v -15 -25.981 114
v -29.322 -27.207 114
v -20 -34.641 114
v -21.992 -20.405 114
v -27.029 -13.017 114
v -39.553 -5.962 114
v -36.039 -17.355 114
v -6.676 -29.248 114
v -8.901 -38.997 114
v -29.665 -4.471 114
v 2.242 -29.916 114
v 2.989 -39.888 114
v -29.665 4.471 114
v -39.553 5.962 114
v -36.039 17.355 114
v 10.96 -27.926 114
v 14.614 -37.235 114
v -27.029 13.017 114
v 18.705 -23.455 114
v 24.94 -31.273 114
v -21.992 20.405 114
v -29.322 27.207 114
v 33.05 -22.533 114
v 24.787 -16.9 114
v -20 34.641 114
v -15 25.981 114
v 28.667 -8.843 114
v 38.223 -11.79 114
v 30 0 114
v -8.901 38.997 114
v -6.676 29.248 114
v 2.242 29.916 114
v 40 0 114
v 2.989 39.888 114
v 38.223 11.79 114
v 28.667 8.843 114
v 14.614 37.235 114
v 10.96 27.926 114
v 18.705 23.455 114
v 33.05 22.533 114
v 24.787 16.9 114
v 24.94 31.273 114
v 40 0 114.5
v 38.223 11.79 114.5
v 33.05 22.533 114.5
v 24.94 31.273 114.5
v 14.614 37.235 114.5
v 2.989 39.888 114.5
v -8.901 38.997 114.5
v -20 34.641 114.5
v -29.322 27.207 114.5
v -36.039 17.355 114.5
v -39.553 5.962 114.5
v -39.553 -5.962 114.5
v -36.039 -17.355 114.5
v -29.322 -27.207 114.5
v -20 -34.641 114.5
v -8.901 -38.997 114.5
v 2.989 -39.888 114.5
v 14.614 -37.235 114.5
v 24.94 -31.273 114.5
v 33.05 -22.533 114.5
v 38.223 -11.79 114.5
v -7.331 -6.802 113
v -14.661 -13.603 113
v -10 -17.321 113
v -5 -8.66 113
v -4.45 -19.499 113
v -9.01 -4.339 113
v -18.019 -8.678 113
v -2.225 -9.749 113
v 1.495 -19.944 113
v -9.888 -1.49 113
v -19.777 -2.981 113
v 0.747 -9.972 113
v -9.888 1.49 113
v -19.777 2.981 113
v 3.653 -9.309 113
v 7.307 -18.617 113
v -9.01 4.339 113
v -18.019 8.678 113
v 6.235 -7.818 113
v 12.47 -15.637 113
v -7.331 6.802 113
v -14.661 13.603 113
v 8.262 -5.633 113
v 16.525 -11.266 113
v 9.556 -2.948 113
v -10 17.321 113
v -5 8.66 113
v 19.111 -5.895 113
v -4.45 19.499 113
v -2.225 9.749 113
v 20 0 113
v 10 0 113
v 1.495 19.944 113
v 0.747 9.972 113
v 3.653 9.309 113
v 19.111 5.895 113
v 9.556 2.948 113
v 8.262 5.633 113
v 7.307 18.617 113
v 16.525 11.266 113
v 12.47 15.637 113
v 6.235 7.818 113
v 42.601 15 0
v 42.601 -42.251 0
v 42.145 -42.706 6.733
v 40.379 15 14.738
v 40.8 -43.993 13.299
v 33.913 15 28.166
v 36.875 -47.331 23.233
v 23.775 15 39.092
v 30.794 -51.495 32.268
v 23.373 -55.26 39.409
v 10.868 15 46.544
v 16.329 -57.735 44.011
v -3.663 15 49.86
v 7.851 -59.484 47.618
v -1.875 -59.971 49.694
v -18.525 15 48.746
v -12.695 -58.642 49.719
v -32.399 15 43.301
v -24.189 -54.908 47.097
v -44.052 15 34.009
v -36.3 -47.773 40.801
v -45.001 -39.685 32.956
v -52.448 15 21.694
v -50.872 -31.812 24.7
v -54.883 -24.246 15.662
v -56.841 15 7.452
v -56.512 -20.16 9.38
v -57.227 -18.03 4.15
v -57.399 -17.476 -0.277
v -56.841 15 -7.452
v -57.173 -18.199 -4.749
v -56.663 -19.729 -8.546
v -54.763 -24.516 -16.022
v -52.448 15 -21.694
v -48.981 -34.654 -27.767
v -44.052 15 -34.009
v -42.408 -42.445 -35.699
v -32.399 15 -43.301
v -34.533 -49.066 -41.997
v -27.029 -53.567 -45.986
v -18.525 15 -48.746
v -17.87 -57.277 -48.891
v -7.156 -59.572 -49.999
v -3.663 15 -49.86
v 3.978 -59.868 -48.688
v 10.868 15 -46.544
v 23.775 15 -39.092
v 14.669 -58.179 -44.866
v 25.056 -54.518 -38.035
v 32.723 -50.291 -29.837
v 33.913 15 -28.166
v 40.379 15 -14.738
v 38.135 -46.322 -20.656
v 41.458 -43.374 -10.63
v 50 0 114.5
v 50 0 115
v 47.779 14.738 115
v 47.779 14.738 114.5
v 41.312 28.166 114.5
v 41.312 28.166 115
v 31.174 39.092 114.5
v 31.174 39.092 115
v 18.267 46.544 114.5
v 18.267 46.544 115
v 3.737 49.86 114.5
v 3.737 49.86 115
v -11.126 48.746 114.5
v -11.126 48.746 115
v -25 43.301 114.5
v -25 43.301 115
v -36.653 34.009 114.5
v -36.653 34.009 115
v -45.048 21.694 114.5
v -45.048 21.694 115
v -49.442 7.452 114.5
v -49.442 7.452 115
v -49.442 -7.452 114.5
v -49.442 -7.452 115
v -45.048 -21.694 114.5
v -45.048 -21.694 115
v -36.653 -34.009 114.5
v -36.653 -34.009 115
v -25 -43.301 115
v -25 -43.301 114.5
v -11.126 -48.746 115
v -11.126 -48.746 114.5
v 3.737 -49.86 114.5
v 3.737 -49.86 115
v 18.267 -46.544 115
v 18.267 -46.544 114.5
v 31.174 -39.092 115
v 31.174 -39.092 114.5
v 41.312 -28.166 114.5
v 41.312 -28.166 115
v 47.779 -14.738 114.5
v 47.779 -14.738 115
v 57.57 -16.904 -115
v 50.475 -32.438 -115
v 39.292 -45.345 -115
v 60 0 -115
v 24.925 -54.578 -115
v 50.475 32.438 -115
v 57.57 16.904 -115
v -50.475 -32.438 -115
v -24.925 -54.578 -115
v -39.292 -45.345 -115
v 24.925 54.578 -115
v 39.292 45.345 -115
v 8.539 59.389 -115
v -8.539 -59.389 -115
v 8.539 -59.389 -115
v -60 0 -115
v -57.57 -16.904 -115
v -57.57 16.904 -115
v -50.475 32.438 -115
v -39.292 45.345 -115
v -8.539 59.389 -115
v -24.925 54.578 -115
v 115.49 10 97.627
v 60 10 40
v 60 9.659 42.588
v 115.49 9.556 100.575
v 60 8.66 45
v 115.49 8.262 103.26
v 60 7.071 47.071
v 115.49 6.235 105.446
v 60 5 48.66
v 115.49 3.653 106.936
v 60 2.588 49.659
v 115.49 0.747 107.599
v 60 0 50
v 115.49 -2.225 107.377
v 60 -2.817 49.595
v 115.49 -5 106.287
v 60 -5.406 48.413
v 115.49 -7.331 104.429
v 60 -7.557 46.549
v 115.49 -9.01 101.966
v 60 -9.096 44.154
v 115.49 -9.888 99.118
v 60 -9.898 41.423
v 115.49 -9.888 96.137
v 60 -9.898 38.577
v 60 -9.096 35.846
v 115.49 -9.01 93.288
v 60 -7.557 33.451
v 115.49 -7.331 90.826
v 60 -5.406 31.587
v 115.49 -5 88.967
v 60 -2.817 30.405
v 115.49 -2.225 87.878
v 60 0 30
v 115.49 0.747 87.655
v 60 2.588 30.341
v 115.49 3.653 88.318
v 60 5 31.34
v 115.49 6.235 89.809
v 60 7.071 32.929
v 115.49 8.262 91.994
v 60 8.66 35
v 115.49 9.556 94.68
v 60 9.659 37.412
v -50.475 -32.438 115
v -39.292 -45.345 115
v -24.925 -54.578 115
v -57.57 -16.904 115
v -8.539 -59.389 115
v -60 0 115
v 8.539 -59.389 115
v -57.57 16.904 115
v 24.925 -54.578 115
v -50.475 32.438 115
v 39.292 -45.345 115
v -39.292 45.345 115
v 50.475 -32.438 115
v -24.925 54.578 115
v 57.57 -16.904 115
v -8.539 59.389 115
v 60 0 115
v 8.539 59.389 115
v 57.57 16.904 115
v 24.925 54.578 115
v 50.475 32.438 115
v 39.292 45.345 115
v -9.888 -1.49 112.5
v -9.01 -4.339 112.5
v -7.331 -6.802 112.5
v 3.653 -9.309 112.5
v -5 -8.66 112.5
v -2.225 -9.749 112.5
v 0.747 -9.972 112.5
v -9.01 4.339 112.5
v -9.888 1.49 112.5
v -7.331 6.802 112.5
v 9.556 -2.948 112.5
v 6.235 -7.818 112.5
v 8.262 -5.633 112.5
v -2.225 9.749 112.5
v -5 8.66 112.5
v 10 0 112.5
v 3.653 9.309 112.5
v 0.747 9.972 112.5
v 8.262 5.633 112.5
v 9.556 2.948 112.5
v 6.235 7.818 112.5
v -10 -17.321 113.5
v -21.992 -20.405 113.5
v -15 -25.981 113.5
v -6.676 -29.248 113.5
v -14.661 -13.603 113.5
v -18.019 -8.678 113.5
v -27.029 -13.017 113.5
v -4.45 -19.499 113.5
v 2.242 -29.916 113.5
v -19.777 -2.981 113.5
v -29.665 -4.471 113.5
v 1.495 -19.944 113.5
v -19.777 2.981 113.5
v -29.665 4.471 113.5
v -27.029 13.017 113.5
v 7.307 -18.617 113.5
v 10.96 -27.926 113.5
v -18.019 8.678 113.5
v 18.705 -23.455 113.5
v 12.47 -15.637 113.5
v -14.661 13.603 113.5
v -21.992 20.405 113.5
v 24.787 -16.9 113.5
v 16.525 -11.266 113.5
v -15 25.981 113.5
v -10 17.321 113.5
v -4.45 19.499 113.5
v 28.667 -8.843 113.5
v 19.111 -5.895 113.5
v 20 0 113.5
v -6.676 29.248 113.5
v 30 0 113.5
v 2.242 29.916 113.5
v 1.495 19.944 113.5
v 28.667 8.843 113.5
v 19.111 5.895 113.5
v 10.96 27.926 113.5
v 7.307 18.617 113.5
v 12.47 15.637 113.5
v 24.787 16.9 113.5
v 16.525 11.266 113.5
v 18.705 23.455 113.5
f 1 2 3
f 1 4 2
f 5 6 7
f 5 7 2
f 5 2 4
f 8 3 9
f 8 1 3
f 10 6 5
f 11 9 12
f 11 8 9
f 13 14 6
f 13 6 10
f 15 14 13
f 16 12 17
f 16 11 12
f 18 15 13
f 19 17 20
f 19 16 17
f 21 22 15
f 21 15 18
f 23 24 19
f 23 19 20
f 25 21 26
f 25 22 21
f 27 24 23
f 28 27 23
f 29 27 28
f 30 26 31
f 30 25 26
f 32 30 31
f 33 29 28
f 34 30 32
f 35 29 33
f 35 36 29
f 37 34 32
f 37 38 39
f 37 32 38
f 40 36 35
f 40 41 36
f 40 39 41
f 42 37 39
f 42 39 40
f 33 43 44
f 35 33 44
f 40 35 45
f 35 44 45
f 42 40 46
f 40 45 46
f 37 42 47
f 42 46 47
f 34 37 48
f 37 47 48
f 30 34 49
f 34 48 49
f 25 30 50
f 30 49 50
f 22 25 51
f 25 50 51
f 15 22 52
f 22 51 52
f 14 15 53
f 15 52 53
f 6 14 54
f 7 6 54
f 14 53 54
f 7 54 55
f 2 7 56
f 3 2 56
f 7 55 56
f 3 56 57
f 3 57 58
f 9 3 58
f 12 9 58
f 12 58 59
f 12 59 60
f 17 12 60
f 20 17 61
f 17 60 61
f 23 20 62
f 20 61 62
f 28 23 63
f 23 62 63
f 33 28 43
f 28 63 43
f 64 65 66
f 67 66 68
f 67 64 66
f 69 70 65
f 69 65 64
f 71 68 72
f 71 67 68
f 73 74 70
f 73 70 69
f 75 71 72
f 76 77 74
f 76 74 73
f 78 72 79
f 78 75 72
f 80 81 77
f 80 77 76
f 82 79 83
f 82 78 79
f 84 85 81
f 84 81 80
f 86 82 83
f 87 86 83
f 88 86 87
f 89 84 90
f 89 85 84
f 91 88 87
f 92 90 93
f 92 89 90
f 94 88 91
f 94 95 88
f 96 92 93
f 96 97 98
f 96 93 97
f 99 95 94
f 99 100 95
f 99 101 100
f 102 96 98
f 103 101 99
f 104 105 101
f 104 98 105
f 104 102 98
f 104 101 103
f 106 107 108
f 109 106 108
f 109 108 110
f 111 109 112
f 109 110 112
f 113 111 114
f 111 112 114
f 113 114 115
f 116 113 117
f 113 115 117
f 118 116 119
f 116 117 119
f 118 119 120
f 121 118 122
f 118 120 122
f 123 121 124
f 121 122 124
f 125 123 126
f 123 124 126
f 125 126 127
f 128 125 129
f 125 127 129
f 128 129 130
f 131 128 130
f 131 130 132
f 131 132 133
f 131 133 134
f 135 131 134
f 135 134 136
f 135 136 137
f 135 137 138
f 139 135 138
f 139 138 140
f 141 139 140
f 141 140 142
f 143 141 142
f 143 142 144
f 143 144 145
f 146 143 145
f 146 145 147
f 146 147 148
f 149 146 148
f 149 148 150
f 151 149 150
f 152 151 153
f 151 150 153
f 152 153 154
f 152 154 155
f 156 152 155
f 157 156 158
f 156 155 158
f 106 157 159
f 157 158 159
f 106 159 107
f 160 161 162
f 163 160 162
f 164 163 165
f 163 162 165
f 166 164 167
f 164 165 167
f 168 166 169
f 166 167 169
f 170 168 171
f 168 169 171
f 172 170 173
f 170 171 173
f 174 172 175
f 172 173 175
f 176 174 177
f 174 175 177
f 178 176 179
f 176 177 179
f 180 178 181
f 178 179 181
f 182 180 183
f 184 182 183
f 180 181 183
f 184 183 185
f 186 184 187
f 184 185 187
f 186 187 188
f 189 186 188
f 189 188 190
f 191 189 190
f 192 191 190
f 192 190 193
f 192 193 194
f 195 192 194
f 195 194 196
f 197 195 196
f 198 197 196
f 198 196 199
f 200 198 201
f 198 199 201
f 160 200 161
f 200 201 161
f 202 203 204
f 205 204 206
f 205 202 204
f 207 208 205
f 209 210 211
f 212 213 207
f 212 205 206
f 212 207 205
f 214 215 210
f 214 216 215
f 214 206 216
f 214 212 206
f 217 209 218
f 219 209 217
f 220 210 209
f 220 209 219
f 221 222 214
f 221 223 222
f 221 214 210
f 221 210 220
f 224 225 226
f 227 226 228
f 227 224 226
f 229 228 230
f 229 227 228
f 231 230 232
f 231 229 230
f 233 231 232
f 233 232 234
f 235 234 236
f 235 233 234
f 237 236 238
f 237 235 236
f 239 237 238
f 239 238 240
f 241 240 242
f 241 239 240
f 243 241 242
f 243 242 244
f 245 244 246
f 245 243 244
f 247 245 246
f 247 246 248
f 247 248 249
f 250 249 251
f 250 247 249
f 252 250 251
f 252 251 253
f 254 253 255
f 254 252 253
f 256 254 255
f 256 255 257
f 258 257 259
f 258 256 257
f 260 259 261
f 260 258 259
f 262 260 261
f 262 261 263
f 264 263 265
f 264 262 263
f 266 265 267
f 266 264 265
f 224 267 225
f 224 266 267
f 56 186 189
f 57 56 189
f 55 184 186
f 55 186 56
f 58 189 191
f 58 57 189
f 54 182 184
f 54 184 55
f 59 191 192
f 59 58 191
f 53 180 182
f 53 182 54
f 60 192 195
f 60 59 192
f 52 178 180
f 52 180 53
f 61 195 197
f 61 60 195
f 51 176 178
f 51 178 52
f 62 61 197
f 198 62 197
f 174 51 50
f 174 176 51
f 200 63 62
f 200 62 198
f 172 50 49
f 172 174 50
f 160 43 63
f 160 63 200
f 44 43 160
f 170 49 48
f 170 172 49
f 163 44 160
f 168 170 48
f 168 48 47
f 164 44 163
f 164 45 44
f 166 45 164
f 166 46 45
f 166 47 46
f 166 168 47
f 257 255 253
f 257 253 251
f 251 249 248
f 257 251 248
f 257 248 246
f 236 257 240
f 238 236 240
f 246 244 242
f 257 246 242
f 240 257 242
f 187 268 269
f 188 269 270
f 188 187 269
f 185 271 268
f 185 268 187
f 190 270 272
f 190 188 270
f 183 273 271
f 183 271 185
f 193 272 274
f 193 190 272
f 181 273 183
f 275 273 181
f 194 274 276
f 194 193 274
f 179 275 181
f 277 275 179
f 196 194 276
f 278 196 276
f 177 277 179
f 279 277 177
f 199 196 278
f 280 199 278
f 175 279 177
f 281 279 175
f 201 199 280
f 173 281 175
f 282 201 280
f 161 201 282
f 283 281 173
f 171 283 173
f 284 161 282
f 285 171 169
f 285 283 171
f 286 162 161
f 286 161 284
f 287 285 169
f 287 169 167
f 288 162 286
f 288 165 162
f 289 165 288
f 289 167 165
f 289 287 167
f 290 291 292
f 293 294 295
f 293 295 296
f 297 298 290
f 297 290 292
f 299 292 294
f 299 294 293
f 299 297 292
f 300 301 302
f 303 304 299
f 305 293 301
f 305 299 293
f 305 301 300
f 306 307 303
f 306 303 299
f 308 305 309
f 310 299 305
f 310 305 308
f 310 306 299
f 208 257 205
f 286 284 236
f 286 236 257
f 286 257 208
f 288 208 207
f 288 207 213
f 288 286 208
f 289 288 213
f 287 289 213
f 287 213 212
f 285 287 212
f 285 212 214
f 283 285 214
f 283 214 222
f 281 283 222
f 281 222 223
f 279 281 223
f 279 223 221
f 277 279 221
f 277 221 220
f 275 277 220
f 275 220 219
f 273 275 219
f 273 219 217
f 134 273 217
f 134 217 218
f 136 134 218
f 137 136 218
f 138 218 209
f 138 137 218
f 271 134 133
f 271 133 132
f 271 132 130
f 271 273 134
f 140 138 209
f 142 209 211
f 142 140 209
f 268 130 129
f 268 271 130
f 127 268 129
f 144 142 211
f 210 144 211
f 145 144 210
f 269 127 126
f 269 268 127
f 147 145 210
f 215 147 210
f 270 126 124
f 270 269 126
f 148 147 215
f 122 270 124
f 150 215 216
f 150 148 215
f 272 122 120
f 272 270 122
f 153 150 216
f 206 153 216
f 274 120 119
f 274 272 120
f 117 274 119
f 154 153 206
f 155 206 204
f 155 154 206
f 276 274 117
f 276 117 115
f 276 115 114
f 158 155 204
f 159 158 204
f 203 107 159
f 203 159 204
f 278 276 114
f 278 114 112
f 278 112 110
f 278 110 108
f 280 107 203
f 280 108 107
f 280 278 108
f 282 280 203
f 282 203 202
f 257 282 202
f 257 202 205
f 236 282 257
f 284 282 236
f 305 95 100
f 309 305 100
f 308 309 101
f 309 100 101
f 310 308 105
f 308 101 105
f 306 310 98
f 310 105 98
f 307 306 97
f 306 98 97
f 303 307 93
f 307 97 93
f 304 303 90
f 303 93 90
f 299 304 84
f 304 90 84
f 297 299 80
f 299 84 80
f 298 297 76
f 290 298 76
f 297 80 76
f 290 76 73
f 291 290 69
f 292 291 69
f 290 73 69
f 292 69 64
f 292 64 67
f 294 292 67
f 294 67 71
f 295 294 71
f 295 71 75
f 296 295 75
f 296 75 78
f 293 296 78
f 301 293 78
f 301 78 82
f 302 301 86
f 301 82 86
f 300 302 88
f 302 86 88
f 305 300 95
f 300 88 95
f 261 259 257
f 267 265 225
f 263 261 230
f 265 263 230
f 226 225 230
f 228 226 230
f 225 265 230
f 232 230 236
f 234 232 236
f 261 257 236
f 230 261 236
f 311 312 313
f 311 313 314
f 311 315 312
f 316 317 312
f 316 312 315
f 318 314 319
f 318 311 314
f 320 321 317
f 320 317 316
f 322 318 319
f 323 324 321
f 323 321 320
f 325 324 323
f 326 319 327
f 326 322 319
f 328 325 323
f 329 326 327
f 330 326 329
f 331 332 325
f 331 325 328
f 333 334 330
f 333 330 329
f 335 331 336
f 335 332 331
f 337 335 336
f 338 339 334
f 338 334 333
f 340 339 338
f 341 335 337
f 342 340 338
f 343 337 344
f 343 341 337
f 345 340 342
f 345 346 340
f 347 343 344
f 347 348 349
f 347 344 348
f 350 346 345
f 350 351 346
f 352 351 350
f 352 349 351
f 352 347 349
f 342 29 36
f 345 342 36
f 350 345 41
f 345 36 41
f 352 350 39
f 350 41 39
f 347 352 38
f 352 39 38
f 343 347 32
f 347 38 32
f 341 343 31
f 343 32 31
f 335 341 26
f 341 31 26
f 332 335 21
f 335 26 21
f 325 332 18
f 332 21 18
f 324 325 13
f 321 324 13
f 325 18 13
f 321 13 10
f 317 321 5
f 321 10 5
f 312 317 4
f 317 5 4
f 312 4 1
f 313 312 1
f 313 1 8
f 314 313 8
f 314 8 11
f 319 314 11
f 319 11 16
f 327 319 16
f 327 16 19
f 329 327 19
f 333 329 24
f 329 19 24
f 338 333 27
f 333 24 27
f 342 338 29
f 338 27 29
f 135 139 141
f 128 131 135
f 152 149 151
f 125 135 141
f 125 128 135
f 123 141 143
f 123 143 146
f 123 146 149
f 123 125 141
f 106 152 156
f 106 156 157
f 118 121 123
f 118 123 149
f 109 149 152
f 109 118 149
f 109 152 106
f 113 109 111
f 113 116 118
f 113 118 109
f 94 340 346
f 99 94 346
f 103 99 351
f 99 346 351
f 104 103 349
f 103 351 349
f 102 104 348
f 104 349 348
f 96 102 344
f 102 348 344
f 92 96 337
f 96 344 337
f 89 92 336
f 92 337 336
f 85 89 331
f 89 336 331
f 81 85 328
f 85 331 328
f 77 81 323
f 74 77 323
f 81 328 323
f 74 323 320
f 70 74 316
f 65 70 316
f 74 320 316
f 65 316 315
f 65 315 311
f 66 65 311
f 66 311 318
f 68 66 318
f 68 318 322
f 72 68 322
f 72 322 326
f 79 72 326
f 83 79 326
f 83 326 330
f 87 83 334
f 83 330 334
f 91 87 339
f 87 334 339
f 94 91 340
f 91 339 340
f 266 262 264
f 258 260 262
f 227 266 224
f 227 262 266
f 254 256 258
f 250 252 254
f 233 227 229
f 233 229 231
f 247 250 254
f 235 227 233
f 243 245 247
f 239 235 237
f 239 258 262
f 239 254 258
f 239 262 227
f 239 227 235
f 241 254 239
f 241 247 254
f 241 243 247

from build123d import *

# Parameters (mm, degrees)
F3_R      = 50
F4_DEPTH  = 75
F5_R      = 50
F6_DEPTH  = 0.5
F7_R      = 40
F8_DEPTH  = 0.5
F9_R      = 30
F10_DEPTH = 0.5
F11_R     = 20
F12_DEPTH = 0.5
F13_R     = 10
F14_DEPTH = 0.5
F16_R     = 10


with BuildPart() as f2:
    # F1 (on Front) → F2 (revolve)
    with BuildSketch(Plane.XZ):
        Polygon((0, 115), (0, 0), (0, -115), (60, -115), (60, 115), align=None)
    revolve(axis=Axis((0, 0, 57.5), (0, 0, 1)))

    # F3 (on offset) → F4 (cut)
    with BuildSketch(Plane.XZ.offset(60)):
        with Locations((-7.399289, 0)):
            Circle(F3_R)
    extrude(amount=-F4_DEPTH, mode=Mode.SUBTRACT)

    # F5 (on face) → F6 (cut)
    with BuildSketch(Plane.XY.offset(115)):
        Circle(F5_R)
    extrude(amount=-F6_DEPTH, mode=Mode.SUBTRACT)

    # F7 (on face) → F8 (cut)
    with BuildSketch(Plane.XY.offset(114.5)):
        Circle(F7_R)
    extrude(amount=-F8_DEPTH, mode=Mode.SUBTRACT)

    # F9 (on face) → F10 (cut)
    with BuildSketch(Plane.XY.offset(114)):
        Circle(F9_R)
    extrude(amount=-F10_DEPTH, mode=Mode.SUBTRACT)

    # F11 (on face) → F12 (cut)
    with BuildSketch(Plane.XY.offset(113.5)):
        Circle(F11_R)
    extrude(amount=-F12_DEPTH, mode=Mode.SUBTRACT)

    # F13 (on face) → F14 (cut)
    with BuildSketch(Plane.XY.offset(113)):
        Circle(F13_R)
    extrude(amount=-F14_DEPTH, mode=Mode.SUBTRACT)

    # F18: sweep along a path in F17
    with BuildLine(Plane.XZ) as f18_path:
        Line((60.510088, 39.84075), (115.99975, 97.467979))
    # F16 (on offset) → F18 (sweep)
    with BuildSketch(Plane.YZ.offset(60)):
        with Locations((0, 40)):
            Circle(F16_R)
    sweep(path=f18_path.line)


solid = f2.part
